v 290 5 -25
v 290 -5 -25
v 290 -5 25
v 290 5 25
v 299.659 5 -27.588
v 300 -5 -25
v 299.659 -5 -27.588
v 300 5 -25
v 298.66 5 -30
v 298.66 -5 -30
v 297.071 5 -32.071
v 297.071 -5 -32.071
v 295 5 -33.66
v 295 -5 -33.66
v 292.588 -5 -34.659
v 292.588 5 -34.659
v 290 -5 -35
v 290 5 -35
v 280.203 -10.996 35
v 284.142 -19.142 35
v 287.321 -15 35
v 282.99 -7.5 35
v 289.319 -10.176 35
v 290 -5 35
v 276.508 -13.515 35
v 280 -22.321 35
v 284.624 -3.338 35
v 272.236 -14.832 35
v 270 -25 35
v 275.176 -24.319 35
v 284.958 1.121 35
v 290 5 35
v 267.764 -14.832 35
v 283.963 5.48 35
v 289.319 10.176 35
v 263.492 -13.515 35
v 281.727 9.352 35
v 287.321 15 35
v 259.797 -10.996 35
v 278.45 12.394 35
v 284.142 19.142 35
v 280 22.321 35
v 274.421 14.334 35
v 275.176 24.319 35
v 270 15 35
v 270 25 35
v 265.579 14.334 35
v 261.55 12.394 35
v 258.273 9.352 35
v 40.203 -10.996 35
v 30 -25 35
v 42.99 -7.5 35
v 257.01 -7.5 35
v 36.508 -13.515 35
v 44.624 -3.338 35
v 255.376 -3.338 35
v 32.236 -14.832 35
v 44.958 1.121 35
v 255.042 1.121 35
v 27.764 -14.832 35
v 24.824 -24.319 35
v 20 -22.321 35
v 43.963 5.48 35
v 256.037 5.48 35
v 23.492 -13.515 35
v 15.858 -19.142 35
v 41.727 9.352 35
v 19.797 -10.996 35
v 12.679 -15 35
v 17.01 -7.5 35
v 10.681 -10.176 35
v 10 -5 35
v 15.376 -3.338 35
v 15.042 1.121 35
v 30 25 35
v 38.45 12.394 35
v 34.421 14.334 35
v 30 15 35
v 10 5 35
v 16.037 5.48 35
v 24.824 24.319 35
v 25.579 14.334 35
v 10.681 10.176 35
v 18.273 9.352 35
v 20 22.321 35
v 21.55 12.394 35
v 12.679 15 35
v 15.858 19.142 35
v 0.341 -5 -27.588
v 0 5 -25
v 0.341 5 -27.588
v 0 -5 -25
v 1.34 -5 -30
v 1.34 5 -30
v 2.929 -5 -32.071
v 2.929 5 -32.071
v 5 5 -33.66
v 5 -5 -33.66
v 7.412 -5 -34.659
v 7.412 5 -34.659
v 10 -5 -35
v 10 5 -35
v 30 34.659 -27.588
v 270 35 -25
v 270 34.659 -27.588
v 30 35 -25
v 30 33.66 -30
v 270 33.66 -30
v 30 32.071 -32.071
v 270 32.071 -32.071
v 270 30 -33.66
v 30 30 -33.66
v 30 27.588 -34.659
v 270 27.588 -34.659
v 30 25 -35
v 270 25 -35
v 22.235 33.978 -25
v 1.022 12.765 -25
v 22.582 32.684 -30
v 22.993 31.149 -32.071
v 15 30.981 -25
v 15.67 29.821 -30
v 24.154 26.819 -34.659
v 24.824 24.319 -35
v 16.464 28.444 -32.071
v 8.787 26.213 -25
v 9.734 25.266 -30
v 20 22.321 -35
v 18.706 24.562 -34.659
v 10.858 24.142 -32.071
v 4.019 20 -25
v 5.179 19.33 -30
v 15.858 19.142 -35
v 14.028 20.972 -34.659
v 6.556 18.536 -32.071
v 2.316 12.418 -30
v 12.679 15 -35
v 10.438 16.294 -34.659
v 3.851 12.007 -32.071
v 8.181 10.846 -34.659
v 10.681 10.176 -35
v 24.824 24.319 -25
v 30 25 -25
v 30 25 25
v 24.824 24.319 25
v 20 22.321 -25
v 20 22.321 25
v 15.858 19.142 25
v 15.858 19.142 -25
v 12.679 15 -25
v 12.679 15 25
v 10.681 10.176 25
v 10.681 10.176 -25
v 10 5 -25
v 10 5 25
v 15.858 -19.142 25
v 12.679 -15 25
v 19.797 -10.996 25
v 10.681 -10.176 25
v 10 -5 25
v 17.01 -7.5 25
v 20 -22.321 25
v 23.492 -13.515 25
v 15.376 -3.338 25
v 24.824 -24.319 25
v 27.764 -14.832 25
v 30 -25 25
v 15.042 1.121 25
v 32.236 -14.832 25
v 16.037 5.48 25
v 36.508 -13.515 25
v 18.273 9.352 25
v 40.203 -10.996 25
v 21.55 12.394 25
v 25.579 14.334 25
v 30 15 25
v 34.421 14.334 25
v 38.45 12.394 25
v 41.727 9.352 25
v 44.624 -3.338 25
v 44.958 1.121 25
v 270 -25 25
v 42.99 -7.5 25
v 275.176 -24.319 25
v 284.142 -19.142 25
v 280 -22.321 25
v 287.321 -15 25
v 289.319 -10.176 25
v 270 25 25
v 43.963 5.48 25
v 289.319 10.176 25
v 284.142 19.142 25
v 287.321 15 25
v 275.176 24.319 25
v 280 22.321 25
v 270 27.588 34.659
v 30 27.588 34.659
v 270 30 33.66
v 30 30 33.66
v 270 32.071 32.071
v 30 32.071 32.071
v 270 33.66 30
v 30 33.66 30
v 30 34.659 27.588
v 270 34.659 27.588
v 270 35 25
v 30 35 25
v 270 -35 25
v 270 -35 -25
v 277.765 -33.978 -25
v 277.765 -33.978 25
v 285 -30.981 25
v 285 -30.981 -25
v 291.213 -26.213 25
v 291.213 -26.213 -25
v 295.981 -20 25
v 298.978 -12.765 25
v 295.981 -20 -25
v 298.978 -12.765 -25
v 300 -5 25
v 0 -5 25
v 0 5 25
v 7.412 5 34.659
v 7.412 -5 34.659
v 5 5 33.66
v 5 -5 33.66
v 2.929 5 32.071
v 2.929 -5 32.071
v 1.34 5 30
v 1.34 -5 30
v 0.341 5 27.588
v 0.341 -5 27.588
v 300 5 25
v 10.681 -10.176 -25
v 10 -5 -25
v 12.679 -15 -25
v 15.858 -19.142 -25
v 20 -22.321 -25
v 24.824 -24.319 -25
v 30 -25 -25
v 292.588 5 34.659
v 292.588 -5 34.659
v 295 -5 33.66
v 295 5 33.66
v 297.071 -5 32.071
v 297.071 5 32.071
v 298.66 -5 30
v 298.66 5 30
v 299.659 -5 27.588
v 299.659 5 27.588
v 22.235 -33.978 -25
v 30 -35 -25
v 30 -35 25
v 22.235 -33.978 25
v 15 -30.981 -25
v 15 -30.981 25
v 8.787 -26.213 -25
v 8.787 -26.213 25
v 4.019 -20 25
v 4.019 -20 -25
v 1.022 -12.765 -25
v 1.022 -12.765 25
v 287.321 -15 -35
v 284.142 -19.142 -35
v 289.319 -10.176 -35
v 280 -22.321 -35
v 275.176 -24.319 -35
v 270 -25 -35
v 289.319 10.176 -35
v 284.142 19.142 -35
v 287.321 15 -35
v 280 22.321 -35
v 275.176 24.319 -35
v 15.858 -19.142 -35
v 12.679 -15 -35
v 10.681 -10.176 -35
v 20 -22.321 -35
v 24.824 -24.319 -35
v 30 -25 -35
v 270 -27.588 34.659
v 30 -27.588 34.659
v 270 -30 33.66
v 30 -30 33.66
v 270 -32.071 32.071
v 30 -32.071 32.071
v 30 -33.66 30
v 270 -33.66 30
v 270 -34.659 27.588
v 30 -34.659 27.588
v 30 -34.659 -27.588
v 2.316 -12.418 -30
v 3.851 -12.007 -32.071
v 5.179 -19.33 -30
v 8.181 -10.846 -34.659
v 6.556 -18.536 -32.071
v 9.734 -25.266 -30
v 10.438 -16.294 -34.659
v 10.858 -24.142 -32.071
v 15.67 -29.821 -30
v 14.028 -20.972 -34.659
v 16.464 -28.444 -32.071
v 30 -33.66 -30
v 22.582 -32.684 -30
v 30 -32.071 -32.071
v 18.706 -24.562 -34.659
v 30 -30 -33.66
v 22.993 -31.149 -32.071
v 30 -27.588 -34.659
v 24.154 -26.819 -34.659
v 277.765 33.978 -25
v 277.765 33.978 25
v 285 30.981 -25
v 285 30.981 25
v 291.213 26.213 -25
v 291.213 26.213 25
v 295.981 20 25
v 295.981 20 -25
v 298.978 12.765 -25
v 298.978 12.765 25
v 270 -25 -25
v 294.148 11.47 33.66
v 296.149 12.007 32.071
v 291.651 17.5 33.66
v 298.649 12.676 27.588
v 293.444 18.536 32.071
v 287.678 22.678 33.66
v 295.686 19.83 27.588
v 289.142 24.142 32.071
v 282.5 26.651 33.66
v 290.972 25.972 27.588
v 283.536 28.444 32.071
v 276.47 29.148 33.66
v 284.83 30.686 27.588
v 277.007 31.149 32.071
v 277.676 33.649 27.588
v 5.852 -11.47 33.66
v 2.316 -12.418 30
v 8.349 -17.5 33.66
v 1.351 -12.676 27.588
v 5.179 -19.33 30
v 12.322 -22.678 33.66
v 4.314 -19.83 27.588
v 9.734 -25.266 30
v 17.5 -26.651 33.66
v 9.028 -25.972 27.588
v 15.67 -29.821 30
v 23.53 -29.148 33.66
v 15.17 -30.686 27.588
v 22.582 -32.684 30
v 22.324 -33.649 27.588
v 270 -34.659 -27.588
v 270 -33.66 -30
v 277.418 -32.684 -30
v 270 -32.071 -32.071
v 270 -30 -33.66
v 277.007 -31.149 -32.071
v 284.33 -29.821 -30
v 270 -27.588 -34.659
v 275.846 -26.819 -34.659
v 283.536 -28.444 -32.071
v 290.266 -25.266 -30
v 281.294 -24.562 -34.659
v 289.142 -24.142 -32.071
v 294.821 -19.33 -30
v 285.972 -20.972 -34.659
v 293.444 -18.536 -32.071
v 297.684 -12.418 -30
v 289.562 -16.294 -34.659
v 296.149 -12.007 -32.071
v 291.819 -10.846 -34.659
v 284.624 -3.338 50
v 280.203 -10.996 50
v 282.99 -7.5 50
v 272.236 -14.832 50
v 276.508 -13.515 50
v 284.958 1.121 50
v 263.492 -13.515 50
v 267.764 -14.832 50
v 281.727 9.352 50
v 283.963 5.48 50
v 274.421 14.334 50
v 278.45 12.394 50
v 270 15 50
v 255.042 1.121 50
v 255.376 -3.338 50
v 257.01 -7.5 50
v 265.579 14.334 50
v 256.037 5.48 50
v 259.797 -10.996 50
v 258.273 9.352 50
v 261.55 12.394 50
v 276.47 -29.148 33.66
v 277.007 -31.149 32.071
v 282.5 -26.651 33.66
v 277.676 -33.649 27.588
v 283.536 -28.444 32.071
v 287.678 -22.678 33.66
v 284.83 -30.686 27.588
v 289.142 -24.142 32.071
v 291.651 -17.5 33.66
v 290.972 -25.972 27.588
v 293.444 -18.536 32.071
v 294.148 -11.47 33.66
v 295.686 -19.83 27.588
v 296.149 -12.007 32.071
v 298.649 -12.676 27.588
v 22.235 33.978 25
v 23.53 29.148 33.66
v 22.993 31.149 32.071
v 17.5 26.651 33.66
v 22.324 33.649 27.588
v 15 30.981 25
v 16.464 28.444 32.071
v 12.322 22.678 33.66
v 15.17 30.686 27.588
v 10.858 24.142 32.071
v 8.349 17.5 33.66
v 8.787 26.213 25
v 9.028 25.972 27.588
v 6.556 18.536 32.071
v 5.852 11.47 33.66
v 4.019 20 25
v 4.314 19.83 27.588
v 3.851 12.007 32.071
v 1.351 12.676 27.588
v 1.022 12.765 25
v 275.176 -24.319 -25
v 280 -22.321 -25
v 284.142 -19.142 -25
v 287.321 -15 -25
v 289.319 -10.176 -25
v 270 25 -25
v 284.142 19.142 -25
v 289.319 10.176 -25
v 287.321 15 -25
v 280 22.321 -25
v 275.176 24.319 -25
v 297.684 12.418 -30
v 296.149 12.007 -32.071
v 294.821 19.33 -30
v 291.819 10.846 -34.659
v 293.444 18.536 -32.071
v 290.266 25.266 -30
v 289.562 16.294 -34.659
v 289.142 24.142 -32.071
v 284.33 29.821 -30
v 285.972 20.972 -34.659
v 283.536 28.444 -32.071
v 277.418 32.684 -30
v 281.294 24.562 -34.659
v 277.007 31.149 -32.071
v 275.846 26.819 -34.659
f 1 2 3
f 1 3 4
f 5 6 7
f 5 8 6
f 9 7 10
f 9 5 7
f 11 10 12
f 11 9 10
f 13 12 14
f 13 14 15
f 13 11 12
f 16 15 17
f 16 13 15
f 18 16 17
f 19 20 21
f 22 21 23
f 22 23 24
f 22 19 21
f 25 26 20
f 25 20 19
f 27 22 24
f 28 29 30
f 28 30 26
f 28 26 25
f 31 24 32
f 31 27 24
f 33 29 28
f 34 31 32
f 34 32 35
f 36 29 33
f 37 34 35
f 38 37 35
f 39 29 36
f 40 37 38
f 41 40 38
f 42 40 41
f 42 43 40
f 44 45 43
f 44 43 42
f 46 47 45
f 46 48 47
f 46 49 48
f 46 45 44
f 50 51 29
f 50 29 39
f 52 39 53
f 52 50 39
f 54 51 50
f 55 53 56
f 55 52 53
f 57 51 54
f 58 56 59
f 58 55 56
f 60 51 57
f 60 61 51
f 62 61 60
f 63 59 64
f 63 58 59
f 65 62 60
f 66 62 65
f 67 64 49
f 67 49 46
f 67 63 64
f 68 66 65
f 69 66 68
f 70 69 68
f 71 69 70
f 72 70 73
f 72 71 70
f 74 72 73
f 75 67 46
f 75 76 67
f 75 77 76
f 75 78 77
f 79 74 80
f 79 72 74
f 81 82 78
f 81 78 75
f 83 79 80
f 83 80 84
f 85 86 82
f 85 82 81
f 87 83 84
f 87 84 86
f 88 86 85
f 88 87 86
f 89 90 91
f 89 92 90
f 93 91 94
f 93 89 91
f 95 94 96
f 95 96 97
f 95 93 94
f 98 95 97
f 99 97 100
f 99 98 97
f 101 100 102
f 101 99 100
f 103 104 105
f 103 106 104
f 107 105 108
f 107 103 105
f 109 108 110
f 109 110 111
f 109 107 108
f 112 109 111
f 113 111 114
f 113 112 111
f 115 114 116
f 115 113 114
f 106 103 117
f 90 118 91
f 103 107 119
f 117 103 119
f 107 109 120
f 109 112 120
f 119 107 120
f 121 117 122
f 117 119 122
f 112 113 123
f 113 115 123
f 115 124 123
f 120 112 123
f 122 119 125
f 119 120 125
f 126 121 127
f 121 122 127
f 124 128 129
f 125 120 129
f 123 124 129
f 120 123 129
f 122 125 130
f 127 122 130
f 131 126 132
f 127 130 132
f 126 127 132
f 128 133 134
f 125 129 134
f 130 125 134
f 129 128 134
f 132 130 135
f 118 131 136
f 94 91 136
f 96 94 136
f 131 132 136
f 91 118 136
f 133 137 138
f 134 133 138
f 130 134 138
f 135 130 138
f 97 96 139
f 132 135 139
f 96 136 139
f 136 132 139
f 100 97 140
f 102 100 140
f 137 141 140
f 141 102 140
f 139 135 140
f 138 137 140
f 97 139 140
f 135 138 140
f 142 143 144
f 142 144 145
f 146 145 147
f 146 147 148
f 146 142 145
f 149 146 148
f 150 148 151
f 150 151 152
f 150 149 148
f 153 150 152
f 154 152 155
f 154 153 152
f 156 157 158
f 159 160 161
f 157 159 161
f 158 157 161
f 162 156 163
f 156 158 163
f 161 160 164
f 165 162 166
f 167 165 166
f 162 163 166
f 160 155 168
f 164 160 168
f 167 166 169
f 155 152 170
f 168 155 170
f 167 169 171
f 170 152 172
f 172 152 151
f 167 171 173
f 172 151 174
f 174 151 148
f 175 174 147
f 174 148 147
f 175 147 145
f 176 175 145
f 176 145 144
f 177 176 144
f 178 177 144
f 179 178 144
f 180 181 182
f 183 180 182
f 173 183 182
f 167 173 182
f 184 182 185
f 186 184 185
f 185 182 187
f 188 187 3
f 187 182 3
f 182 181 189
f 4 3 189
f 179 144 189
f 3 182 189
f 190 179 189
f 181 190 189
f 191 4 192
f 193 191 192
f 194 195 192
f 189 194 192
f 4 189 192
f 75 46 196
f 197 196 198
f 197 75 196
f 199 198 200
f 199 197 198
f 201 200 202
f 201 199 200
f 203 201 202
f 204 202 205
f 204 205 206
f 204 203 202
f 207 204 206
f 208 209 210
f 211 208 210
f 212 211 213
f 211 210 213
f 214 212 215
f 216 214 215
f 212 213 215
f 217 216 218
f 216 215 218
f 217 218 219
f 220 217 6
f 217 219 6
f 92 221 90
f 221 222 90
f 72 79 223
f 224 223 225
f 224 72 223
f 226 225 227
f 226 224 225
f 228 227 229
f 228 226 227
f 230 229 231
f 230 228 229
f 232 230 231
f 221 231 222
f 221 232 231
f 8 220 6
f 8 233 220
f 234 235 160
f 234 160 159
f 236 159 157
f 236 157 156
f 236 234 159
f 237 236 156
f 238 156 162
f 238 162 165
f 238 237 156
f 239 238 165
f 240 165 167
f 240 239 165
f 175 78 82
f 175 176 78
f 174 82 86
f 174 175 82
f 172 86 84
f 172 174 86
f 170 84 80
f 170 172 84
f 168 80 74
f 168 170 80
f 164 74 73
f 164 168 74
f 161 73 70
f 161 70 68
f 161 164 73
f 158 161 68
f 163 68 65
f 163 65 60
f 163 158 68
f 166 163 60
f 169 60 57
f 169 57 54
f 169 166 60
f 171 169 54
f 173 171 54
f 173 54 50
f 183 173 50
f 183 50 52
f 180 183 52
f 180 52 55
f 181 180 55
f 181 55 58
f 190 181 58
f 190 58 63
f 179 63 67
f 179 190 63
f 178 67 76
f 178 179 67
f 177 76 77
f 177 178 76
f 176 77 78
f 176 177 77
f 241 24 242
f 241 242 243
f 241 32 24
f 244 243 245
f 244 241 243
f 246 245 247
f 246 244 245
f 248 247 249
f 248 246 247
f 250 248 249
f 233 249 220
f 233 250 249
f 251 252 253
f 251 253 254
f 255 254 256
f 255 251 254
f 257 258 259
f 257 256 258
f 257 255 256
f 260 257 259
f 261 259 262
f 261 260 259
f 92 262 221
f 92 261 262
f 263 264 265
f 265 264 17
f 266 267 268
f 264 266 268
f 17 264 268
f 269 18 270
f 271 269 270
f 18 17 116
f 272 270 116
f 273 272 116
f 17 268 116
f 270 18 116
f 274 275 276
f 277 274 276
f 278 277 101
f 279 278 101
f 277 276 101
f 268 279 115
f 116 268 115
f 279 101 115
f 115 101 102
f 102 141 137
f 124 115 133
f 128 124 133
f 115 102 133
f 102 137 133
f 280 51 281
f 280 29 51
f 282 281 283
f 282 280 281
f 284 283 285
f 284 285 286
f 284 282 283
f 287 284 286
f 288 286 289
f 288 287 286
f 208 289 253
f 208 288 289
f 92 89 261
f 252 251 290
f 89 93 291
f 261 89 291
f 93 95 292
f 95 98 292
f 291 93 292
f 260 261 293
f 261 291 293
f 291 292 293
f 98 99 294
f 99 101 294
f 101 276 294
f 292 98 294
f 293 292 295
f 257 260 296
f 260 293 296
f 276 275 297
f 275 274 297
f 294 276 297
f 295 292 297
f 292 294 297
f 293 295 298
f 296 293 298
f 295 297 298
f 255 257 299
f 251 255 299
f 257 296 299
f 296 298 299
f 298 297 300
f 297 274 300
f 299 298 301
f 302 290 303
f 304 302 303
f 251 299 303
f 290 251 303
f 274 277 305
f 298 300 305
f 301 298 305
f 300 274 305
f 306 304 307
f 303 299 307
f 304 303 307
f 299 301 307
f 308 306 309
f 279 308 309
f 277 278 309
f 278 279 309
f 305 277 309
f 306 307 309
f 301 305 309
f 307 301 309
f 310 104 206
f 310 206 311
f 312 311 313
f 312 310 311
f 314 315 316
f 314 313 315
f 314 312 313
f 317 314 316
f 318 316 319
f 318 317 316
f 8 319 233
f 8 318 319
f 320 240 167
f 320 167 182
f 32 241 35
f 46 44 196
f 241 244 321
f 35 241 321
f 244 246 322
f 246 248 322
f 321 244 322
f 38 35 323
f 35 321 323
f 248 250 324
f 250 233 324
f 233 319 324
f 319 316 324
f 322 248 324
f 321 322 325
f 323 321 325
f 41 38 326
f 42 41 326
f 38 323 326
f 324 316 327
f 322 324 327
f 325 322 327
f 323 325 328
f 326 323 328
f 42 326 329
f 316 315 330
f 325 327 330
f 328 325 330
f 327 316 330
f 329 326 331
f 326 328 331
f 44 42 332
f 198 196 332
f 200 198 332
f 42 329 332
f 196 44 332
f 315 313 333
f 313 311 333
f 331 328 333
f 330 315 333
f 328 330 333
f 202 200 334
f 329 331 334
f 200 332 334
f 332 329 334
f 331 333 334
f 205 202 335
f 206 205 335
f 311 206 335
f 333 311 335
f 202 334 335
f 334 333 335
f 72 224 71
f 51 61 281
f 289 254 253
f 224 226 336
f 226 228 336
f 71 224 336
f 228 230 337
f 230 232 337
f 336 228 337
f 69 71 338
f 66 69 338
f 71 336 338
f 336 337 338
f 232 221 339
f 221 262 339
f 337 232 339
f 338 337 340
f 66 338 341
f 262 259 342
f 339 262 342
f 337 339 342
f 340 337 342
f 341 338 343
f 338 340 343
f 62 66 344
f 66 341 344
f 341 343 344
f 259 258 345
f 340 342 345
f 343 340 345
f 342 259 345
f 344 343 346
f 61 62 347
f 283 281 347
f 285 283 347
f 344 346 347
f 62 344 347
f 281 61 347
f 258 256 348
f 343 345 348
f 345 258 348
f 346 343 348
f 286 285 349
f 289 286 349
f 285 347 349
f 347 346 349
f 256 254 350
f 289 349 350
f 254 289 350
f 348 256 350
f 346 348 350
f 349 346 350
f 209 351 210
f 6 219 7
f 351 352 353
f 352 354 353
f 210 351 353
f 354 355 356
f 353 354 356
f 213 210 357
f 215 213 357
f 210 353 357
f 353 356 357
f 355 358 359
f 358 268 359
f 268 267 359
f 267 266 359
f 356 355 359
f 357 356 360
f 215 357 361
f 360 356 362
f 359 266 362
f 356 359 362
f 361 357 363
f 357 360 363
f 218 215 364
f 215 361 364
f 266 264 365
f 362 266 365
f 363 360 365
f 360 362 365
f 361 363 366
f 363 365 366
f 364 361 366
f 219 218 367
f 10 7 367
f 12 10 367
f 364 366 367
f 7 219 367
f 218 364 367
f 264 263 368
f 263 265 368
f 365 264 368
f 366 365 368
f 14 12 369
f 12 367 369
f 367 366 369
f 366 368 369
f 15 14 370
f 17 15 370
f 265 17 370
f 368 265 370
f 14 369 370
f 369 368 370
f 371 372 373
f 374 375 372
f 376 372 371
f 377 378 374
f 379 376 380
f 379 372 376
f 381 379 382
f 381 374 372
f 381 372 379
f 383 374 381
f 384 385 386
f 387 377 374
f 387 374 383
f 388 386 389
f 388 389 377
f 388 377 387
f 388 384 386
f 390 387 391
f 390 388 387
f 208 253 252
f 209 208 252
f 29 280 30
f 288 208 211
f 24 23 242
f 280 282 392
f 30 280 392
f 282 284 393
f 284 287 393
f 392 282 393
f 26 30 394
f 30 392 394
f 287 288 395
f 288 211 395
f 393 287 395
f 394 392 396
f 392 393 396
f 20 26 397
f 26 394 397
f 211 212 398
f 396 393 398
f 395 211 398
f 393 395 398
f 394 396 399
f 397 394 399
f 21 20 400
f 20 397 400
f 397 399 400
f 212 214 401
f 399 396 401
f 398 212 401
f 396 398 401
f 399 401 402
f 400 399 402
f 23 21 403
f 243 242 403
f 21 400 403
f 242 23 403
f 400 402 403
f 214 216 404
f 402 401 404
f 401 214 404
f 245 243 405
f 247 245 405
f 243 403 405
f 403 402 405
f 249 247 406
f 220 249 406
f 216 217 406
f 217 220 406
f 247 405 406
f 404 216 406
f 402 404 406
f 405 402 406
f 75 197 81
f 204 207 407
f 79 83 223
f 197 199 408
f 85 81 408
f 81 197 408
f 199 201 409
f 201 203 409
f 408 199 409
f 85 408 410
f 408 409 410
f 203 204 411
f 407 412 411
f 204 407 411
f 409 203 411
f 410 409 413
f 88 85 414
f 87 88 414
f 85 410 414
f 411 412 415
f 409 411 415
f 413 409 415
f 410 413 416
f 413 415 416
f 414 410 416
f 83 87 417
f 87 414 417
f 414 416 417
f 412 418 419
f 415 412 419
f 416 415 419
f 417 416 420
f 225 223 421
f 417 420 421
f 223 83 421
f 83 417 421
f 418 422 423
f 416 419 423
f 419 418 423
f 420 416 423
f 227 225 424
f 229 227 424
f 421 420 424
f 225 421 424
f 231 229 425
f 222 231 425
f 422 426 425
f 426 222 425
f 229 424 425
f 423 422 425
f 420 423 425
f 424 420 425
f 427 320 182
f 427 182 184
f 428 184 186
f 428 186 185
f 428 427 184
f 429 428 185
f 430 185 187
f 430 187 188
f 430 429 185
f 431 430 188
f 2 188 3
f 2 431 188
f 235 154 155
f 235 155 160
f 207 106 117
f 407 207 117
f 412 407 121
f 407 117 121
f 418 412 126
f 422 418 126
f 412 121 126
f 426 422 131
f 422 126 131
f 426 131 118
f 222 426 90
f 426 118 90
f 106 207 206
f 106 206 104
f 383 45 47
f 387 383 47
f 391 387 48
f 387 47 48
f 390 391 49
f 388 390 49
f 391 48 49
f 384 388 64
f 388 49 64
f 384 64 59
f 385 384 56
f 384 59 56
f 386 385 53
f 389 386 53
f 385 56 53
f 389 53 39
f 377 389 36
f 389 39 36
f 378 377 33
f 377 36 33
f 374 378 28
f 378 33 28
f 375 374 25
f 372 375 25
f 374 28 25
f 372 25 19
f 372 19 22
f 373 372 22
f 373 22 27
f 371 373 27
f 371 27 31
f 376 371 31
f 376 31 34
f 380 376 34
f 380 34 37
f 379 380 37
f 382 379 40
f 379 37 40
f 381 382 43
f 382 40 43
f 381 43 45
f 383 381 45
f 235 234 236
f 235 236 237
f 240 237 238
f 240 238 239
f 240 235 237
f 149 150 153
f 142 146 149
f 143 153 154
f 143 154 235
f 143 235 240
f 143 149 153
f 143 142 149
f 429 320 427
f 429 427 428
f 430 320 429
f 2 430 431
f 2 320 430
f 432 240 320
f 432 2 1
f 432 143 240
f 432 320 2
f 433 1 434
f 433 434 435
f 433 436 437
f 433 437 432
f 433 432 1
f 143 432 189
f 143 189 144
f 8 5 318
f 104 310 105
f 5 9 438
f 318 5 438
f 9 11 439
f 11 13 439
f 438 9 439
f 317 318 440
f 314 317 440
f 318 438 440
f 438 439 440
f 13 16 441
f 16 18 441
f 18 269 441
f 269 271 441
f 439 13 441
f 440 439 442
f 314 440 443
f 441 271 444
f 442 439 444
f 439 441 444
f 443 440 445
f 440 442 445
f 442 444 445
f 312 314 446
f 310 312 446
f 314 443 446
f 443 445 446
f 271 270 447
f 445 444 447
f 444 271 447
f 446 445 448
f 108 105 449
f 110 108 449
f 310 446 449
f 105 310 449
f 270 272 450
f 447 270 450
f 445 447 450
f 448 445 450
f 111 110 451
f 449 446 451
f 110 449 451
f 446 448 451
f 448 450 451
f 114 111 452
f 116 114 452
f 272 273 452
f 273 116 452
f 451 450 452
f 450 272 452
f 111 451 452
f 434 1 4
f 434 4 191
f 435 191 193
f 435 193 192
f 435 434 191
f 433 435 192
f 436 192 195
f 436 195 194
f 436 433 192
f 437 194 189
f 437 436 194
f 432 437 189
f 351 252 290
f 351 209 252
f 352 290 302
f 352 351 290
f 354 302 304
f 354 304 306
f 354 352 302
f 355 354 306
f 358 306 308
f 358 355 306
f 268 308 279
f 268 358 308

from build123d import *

# Parameters (mm, degrees)
SKETCH2_W           = 70
SKETCH2_H           = 70
BOSS_EXTRUDE1_DEPTH = 300
FILLET1_R           = 30
FILLET2_R           = 10
SHELL1_START        = -25
SHELL1_DEPTH        = 50
SKETCH3_R           = 15
BOSS_EXTRUDE2_DEPTH = 15
CUT_EXTRUDE1_START  = -30
SKETCH4_R           = 15
CUT_EXTRUDE1_DEPTH  = 30


# Read off the part's stored shape, not the designer's step: Shell1
with BuildPart() as part:
    # Sketch2 → Boss-Extrude1 (new body)
    with BuildSketch(Plane(origin=(0, 0, 0), x_dir=(0, 0, -1), z_dir=(1, 0, 0))):
        Rectangle(SKETCH2_W, SKETCH2_H)
    extrude(amount=BOSS_EXTRUDE1_DEPTH)

    # Fillet1
    fillet1_edges = [part.edges().sort_by_distance(p)[0] for p in [
        (300, 35, 0),
        (0, 35, 0),
        (0, -35, 0),
        (300, -35, 0),
    ]]
    fillet(fillet1_edges, radius=FILLET1_R)

    # Fillet2
    fillet2_edges = [part.edges().sort_by_distance(p)[0] for p in [
        (150, -35, -35),
        (150, -35, 35),
        (0, 0, -35),
        (150, 35, -35),
        (300, 0, -35),
        (291.213203436, 26.213203436, -35),
        (291.213203436, -26.213203436, -35),
        (8.786796564, 26.213203436, -35),
        (8.786796564, -26.213203436, -35),
        (0, 0, 35),
        (300, 0, 35),
        (150, 35, 35),
        (291.213203436, 26.213203436, 35),
        (291.213203436, -26.213203436, 35),
        (8.786796564, 26.213203436, 35),
        (8.786796564, -26.213203436, 35),
    ]]
    fillet(fillet2_edges, radius=FILLET2_R)

    # Shell1 outline → Shell1 (cut)
    with BuildSketch(Plane.XY.offset(SHELL1_START)):
        with BuildLine():
            Line((30, -25), (270, -25))
            ThreePointArc((270, -25), (284.142135624, -19.142135624), (290, -5))
            Line((290, -5), (290, 5))
            ThreePointArc((290, 5), (284.142135624, 19.142135624), (270, 25))
            Line((270, 25), (30, 25))
            ThreePointArc((30, 25), (15.857864376, 19.142135624), (10, 5))
            Line((10, 5), (10, -5))
            ThreePointArc((10, -5), (15.857864376, -19.142135624), (30, -25))
        make_face()
    extrude(amount=SHELL1_DEPTH, mode=Mode.SUBTRACT)

    # Sketch3 → Boss-Extrude2 (add)
    with BuildSketch(Plane.XY.offset(35)):
        with Locations(Location((30, 0, 0), (0, 0, 90))):
            Circle(SKETCH3_R)
        with Locations(Location((270, 0, 0), (0, 0, 90))):
            Circle(SKETCH3_R)
    extrude(amount=BOSS_EXTRUDE2_DEPTH)

    # Sketch4 → Cut-Extrude1 (cut)
    with BuildSketch(Plane.XY.offset(50).offset(CUT_EXTRUDE1_START)):
        with Locations(Location((30, 0, 0), (0, 0, 90))):
            Circle(SKETCH4_R)
    extrude(amount=CUT_EXTRUDE1_DEPTH, mode=Mode.SUBTRACT)


solid = part.part
